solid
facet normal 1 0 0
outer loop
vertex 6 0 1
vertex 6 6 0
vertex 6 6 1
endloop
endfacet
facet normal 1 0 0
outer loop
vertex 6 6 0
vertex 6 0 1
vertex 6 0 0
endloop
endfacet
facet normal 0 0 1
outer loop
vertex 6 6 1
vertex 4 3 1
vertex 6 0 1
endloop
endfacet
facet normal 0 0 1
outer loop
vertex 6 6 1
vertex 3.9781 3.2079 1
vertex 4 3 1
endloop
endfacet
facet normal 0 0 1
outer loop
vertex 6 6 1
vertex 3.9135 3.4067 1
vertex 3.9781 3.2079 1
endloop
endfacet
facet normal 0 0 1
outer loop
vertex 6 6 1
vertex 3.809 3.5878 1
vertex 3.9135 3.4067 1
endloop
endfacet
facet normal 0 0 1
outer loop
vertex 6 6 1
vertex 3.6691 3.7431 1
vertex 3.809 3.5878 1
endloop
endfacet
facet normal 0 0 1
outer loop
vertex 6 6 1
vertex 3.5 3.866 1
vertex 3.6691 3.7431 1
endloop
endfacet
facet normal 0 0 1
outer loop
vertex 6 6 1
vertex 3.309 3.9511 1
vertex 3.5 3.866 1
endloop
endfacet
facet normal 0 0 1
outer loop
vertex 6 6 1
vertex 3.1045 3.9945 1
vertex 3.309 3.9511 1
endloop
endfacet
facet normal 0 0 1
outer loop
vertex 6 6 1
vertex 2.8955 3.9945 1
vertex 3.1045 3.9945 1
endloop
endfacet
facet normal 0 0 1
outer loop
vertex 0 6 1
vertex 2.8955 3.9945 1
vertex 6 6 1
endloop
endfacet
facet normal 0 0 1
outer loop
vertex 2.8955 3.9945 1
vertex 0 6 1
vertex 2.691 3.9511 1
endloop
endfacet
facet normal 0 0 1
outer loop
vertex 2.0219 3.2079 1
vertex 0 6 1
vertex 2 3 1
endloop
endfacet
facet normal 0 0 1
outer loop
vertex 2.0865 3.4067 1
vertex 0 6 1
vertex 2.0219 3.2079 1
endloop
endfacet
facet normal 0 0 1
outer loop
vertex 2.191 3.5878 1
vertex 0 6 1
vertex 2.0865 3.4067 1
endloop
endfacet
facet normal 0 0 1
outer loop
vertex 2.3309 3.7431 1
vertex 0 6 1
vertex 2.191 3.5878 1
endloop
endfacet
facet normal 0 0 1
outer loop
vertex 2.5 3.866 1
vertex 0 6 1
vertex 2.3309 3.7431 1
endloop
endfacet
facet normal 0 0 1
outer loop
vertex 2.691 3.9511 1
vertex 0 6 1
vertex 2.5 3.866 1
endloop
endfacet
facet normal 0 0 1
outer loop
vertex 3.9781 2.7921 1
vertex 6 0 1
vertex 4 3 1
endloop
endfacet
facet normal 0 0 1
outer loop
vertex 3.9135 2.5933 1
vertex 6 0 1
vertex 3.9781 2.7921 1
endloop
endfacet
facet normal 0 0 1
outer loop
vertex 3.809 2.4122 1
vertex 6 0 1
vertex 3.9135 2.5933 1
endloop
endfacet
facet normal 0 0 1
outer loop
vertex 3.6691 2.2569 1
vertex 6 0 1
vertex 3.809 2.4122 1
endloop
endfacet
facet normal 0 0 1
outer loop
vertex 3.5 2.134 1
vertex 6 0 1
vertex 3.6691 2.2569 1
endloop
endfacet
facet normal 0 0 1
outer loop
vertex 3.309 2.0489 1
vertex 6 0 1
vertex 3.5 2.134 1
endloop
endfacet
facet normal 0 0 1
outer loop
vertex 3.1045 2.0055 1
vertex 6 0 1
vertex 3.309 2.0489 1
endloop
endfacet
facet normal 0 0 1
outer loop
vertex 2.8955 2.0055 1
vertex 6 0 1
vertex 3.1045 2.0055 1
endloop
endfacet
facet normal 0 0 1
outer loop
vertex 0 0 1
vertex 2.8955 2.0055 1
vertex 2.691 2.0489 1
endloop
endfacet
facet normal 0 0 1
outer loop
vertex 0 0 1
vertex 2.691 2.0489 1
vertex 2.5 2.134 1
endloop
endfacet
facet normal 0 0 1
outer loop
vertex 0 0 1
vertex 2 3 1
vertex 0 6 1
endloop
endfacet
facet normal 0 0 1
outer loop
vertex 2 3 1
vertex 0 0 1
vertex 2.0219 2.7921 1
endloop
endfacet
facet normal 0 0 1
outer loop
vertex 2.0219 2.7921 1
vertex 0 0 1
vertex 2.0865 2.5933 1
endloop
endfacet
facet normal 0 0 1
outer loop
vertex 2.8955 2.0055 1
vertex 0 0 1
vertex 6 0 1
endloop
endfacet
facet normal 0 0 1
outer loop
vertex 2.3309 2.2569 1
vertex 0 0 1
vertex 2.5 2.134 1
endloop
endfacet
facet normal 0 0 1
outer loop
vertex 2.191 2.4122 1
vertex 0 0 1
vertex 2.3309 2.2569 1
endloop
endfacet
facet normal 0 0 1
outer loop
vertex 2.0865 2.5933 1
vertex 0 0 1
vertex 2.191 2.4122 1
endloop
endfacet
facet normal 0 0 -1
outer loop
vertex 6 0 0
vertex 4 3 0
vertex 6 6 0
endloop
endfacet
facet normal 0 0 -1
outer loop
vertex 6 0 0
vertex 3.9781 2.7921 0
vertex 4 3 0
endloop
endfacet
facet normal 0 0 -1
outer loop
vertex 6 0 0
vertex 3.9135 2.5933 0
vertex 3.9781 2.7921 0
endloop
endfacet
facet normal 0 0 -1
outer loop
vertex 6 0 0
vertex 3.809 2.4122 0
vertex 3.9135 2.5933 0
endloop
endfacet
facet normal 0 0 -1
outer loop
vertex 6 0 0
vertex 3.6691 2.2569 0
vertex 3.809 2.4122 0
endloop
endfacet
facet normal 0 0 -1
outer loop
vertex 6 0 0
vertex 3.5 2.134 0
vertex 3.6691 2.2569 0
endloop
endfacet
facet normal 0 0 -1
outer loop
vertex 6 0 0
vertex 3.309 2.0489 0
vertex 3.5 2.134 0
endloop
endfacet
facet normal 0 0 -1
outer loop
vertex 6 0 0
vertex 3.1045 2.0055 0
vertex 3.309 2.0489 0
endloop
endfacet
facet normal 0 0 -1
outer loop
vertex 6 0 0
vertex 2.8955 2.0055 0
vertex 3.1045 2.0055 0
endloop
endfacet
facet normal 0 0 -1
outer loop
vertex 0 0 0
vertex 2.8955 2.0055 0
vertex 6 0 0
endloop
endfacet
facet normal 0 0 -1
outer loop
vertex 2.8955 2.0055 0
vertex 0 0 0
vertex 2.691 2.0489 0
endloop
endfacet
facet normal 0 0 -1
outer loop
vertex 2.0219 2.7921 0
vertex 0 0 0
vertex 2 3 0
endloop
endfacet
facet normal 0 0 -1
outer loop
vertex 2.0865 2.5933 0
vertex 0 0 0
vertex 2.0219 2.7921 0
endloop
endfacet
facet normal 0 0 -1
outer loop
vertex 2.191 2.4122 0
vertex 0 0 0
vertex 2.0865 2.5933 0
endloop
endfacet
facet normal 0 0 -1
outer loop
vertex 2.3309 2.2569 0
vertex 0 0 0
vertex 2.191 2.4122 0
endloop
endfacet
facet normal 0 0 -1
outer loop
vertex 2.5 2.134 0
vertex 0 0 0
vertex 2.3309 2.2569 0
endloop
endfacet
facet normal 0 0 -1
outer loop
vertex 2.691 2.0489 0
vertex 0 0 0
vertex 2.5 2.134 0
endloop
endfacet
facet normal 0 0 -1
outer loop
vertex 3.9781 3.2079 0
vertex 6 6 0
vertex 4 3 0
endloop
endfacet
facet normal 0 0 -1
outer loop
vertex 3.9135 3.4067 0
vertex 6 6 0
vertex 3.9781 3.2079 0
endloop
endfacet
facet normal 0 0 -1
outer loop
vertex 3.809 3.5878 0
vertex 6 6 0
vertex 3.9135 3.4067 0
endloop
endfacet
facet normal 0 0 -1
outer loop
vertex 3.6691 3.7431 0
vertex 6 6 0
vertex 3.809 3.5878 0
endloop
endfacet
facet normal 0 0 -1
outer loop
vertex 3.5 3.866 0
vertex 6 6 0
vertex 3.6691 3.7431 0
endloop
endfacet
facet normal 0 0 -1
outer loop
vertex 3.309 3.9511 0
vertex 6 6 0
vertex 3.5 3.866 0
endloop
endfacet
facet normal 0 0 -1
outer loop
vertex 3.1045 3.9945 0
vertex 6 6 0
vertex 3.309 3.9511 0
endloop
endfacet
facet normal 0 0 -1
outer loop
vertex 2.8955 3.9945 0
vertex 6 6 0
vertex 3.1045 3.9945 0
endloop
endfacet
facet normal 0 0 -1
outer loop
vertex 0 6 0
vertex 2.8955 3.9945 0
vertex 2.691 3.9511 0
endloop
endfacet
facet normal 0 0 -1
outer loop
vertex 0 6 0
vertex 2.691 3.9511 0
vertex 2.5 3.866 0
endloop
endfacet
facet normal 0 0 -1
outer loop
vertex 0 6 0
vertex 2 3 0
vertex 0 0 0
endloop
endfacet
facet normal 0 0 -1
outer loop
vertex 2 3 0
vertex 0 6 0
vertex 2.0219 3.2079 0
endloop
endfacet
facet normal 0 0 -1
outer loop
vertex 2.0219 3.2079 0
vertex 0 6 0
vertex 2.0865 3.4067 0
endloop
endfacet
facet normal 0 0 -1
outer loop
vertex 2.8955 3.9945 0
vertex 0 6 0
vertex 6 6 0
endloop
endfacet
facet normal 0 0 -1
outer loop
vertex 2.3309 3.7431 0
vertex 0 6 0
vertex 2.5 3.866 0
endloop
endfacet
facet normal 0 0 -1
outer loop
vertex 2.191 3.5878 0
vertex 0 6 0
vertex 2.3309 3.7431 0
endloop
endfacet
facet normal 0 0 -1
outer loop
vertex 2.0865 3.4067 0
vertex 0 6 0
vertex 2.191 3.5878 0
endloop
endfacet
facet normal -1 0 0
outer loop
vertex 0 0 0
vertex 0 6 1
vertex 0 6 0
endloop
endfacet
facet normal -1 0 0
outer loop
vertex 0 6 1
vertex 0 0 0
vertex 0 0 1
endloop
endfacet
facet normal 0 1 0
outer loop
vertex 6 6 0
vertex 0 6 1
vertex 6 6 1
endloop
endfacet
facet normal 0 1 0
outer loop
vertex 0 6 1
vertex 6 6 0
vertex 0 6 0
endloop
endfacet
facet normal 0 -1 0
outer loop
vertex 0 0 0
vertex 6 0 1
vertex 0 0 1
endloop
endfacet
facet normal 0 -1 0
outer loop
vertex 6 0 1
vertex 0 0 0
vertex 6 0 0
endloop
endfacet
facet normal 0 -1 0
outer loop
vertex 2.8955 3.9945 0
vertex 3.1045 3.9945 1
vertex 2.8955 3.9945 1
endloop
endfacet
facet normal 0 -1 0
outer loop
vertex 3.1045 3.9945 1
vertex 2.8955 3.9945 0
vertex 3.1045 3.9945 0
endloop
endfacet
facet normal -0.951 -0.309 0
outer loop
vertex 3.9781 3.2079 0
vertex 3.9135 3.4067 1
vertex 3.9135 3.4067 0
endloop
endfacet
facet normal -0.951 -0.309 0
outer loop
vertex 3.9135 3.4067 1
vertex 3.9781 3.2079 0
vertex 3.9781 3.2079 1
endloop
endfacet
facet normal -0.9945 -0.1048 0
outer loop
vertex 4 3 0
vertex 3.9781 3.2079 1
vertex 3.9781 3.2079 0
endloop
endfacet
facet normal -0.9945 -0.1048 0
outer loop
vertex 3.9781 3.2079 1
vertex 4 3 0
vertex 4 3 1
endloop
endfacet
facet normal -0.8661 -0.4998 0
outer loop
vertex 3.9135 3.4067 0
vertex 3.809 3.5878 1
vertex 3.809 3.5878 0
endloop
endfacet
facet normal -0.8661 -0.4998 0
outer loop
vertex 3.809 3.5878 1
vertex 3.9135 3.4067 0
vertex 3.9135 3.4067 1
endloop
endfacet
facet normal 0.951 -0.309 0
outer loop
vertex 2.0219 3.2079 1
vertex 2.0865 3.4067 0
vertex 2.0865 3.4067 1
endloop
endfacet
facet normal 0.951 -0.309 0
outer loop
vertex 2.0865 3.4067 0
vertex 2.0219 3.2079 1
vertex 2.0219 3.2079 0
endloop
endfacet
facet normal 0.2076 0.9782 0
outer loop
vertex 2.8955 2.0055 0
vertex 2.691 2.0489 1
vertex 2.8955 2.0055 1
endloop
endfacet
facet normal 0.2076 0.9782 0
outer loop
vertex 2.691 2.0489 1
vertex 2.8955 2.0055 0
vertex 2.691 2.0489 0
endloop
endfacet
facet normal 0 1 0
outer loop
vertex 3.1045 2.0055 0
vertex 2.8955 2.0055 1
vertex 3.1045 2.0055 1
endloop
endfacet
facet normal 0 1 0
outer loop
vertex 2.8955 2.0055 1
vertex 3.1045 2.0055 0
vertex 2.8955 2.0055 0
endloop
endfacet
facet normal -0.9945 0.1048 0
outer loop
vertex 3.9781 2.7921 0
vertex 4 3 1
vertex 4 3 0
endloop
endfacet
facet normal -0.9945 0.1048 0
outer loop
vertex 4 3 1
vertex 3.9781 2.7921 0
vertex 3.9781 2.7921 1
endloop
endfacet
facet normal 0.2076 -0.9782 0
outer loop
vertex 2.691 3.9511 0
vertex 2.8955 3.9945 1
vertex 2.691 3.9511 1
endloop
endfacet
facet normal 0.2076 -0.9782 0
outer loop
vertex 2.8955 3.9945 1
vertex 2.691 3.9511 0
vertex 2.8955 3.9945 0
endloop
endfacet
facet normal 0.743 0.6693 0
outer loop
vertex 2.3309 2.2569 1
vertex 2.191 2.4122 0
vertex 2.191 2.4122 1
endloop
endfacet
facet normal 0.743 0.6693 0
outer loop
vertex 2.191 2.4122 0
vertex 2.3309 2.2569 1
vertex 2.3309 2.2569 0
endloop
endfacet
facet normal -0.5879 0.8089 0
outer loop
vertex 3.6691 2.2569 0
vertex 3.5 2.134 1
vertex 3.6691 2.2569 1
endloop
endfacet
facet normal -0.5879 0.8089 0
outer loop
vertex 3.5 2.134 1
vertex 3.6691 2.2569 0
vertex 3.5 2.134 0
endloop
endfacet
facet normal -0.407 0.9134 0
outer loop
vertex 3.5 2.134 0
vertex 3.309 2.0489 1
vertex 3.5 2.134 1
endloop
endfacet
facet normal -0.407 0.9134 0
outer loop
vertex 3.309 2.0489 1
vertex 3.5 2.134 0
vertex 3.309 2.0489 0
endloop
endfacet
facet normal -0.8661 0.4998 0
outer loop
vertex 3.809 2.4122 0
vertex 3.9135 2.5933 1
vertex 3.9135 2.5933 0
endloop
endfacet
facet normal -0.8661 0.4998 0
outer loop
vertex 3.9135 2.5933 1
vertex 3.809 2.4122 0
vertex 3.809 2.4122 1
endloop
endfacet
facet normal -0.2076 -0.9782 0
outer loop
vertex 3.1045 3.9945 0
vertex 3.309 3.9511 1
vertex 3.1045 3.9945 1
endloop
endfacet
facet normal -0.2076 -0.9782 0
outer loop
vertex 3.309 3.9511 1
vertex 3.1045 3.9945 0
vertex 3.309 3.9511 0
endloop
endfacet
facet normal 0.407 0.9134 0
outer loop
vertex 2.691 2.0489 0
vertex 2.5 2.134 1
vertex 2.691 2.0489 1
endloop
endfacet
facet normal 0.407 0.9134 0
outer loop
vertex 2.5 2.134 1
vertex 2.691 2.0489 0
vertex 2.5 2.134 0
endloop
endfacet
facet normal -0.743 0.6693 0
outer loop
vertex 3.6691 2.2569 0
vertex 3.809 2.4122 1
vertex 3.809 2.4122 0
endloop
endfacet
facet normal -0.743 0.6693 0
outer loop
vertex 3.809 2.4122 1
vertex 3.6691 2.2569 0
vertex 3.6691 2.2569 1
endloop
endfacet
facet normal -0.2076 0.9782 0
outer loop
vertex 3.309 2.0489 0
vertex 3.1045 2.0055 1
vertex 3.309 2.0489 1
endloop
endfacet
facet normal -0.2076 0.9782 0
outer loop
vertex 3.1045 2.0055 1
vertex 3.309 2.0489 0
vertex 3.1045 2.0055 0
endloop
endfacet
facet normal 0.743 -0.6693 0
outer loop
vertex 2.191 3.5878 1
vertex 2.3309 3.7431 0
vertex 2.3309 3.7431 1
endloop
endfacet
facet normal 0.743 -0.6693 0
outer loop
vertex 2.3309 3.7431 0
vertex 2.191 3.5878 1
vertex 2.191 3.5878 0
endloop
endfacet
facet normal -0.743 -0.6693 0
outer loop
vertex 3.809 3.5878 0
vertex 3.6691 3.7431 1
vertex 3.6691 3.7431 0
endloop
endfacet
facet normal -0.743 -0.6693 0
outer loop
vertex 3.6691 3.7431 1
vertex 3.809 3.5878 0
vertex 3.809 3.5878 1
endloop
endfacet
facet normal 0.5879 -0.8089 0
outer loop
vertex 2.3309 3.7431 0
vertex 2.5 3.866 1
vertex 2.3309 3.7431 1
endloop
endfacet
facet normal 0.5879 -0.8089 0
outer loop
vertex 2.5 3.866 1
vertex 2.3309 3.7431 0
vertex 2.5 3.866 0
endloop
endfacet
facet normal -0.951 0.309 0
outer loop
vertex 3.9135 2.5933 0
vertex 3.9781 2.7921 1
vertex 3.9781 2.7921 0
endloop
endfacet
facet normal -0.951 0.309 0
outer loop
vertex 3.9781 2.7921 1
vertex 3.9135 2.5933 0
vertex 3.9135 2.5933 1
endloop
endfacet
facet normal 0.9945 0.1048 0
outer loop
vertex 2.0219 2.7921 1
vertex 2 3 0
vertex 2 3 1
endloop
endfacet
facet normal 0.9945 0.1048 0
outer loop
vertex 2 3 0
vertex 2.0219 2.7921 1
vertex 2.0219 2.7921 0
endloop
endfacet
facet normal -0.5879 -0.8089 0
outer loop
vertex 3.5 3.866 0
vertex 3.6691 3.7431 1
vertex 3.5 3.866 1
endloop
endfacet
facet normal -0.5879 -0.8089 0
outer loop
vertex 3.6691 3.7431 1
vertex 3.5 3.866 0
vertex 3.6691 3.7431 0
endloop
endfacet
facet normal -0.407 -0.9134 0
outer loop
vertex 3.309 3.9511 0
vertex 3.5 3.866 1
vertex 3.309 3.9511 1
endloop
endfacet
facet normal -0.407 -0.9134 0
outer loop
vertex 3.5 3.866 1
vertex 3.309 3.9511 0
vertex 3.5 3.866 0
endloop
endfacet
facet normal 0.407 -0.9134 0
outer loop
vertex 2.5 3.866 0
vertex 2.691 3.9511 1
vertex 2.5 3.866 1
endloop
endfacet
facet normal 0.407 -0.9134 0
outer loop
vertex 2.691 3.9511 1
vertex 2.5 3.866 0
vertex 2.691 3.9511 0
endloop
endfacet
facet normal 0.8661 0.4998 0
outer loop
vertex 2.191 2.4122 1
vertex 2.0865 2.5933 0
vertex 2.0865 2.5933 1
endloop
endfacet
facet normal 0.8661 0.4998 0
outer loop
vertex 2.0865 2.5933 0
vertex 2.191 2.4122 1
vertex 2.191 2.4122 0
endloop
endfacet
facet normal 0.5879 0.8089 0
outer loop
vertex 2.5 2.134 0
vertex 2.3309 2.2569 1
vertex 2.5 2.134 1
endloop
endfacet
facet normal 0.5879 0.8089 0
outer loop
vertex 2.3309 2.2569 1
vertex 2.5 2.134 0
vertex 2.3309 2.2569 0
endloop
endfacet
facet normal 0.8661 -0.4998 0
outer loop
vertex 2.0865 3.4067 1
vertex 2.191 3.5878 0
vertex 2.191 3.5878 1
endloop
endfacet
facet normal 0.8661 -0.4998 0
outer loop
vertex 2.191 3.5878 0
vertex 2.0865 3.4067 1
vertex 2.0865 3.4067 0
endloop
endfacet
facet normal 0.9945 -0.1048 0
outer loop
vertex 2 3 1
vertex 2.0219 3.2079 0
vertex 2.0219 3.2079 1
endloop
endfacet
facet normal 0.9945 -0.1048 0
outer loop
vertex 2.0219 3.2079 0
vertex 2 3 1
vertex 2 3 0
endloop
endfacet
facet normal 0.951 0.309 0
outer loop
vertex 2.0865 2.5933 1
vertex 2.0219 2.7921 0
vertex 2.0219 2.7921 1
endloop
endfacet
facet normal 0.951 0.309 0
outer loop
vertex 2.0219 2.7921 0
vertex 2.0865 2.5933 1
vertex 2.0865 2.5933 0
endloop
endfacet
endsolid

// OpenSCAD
$fn = 30;

difference() {
    cube([6,6,1]);
    translate([3, 3, 0]){
        cylinder(r=1, h=1);
    }
}
